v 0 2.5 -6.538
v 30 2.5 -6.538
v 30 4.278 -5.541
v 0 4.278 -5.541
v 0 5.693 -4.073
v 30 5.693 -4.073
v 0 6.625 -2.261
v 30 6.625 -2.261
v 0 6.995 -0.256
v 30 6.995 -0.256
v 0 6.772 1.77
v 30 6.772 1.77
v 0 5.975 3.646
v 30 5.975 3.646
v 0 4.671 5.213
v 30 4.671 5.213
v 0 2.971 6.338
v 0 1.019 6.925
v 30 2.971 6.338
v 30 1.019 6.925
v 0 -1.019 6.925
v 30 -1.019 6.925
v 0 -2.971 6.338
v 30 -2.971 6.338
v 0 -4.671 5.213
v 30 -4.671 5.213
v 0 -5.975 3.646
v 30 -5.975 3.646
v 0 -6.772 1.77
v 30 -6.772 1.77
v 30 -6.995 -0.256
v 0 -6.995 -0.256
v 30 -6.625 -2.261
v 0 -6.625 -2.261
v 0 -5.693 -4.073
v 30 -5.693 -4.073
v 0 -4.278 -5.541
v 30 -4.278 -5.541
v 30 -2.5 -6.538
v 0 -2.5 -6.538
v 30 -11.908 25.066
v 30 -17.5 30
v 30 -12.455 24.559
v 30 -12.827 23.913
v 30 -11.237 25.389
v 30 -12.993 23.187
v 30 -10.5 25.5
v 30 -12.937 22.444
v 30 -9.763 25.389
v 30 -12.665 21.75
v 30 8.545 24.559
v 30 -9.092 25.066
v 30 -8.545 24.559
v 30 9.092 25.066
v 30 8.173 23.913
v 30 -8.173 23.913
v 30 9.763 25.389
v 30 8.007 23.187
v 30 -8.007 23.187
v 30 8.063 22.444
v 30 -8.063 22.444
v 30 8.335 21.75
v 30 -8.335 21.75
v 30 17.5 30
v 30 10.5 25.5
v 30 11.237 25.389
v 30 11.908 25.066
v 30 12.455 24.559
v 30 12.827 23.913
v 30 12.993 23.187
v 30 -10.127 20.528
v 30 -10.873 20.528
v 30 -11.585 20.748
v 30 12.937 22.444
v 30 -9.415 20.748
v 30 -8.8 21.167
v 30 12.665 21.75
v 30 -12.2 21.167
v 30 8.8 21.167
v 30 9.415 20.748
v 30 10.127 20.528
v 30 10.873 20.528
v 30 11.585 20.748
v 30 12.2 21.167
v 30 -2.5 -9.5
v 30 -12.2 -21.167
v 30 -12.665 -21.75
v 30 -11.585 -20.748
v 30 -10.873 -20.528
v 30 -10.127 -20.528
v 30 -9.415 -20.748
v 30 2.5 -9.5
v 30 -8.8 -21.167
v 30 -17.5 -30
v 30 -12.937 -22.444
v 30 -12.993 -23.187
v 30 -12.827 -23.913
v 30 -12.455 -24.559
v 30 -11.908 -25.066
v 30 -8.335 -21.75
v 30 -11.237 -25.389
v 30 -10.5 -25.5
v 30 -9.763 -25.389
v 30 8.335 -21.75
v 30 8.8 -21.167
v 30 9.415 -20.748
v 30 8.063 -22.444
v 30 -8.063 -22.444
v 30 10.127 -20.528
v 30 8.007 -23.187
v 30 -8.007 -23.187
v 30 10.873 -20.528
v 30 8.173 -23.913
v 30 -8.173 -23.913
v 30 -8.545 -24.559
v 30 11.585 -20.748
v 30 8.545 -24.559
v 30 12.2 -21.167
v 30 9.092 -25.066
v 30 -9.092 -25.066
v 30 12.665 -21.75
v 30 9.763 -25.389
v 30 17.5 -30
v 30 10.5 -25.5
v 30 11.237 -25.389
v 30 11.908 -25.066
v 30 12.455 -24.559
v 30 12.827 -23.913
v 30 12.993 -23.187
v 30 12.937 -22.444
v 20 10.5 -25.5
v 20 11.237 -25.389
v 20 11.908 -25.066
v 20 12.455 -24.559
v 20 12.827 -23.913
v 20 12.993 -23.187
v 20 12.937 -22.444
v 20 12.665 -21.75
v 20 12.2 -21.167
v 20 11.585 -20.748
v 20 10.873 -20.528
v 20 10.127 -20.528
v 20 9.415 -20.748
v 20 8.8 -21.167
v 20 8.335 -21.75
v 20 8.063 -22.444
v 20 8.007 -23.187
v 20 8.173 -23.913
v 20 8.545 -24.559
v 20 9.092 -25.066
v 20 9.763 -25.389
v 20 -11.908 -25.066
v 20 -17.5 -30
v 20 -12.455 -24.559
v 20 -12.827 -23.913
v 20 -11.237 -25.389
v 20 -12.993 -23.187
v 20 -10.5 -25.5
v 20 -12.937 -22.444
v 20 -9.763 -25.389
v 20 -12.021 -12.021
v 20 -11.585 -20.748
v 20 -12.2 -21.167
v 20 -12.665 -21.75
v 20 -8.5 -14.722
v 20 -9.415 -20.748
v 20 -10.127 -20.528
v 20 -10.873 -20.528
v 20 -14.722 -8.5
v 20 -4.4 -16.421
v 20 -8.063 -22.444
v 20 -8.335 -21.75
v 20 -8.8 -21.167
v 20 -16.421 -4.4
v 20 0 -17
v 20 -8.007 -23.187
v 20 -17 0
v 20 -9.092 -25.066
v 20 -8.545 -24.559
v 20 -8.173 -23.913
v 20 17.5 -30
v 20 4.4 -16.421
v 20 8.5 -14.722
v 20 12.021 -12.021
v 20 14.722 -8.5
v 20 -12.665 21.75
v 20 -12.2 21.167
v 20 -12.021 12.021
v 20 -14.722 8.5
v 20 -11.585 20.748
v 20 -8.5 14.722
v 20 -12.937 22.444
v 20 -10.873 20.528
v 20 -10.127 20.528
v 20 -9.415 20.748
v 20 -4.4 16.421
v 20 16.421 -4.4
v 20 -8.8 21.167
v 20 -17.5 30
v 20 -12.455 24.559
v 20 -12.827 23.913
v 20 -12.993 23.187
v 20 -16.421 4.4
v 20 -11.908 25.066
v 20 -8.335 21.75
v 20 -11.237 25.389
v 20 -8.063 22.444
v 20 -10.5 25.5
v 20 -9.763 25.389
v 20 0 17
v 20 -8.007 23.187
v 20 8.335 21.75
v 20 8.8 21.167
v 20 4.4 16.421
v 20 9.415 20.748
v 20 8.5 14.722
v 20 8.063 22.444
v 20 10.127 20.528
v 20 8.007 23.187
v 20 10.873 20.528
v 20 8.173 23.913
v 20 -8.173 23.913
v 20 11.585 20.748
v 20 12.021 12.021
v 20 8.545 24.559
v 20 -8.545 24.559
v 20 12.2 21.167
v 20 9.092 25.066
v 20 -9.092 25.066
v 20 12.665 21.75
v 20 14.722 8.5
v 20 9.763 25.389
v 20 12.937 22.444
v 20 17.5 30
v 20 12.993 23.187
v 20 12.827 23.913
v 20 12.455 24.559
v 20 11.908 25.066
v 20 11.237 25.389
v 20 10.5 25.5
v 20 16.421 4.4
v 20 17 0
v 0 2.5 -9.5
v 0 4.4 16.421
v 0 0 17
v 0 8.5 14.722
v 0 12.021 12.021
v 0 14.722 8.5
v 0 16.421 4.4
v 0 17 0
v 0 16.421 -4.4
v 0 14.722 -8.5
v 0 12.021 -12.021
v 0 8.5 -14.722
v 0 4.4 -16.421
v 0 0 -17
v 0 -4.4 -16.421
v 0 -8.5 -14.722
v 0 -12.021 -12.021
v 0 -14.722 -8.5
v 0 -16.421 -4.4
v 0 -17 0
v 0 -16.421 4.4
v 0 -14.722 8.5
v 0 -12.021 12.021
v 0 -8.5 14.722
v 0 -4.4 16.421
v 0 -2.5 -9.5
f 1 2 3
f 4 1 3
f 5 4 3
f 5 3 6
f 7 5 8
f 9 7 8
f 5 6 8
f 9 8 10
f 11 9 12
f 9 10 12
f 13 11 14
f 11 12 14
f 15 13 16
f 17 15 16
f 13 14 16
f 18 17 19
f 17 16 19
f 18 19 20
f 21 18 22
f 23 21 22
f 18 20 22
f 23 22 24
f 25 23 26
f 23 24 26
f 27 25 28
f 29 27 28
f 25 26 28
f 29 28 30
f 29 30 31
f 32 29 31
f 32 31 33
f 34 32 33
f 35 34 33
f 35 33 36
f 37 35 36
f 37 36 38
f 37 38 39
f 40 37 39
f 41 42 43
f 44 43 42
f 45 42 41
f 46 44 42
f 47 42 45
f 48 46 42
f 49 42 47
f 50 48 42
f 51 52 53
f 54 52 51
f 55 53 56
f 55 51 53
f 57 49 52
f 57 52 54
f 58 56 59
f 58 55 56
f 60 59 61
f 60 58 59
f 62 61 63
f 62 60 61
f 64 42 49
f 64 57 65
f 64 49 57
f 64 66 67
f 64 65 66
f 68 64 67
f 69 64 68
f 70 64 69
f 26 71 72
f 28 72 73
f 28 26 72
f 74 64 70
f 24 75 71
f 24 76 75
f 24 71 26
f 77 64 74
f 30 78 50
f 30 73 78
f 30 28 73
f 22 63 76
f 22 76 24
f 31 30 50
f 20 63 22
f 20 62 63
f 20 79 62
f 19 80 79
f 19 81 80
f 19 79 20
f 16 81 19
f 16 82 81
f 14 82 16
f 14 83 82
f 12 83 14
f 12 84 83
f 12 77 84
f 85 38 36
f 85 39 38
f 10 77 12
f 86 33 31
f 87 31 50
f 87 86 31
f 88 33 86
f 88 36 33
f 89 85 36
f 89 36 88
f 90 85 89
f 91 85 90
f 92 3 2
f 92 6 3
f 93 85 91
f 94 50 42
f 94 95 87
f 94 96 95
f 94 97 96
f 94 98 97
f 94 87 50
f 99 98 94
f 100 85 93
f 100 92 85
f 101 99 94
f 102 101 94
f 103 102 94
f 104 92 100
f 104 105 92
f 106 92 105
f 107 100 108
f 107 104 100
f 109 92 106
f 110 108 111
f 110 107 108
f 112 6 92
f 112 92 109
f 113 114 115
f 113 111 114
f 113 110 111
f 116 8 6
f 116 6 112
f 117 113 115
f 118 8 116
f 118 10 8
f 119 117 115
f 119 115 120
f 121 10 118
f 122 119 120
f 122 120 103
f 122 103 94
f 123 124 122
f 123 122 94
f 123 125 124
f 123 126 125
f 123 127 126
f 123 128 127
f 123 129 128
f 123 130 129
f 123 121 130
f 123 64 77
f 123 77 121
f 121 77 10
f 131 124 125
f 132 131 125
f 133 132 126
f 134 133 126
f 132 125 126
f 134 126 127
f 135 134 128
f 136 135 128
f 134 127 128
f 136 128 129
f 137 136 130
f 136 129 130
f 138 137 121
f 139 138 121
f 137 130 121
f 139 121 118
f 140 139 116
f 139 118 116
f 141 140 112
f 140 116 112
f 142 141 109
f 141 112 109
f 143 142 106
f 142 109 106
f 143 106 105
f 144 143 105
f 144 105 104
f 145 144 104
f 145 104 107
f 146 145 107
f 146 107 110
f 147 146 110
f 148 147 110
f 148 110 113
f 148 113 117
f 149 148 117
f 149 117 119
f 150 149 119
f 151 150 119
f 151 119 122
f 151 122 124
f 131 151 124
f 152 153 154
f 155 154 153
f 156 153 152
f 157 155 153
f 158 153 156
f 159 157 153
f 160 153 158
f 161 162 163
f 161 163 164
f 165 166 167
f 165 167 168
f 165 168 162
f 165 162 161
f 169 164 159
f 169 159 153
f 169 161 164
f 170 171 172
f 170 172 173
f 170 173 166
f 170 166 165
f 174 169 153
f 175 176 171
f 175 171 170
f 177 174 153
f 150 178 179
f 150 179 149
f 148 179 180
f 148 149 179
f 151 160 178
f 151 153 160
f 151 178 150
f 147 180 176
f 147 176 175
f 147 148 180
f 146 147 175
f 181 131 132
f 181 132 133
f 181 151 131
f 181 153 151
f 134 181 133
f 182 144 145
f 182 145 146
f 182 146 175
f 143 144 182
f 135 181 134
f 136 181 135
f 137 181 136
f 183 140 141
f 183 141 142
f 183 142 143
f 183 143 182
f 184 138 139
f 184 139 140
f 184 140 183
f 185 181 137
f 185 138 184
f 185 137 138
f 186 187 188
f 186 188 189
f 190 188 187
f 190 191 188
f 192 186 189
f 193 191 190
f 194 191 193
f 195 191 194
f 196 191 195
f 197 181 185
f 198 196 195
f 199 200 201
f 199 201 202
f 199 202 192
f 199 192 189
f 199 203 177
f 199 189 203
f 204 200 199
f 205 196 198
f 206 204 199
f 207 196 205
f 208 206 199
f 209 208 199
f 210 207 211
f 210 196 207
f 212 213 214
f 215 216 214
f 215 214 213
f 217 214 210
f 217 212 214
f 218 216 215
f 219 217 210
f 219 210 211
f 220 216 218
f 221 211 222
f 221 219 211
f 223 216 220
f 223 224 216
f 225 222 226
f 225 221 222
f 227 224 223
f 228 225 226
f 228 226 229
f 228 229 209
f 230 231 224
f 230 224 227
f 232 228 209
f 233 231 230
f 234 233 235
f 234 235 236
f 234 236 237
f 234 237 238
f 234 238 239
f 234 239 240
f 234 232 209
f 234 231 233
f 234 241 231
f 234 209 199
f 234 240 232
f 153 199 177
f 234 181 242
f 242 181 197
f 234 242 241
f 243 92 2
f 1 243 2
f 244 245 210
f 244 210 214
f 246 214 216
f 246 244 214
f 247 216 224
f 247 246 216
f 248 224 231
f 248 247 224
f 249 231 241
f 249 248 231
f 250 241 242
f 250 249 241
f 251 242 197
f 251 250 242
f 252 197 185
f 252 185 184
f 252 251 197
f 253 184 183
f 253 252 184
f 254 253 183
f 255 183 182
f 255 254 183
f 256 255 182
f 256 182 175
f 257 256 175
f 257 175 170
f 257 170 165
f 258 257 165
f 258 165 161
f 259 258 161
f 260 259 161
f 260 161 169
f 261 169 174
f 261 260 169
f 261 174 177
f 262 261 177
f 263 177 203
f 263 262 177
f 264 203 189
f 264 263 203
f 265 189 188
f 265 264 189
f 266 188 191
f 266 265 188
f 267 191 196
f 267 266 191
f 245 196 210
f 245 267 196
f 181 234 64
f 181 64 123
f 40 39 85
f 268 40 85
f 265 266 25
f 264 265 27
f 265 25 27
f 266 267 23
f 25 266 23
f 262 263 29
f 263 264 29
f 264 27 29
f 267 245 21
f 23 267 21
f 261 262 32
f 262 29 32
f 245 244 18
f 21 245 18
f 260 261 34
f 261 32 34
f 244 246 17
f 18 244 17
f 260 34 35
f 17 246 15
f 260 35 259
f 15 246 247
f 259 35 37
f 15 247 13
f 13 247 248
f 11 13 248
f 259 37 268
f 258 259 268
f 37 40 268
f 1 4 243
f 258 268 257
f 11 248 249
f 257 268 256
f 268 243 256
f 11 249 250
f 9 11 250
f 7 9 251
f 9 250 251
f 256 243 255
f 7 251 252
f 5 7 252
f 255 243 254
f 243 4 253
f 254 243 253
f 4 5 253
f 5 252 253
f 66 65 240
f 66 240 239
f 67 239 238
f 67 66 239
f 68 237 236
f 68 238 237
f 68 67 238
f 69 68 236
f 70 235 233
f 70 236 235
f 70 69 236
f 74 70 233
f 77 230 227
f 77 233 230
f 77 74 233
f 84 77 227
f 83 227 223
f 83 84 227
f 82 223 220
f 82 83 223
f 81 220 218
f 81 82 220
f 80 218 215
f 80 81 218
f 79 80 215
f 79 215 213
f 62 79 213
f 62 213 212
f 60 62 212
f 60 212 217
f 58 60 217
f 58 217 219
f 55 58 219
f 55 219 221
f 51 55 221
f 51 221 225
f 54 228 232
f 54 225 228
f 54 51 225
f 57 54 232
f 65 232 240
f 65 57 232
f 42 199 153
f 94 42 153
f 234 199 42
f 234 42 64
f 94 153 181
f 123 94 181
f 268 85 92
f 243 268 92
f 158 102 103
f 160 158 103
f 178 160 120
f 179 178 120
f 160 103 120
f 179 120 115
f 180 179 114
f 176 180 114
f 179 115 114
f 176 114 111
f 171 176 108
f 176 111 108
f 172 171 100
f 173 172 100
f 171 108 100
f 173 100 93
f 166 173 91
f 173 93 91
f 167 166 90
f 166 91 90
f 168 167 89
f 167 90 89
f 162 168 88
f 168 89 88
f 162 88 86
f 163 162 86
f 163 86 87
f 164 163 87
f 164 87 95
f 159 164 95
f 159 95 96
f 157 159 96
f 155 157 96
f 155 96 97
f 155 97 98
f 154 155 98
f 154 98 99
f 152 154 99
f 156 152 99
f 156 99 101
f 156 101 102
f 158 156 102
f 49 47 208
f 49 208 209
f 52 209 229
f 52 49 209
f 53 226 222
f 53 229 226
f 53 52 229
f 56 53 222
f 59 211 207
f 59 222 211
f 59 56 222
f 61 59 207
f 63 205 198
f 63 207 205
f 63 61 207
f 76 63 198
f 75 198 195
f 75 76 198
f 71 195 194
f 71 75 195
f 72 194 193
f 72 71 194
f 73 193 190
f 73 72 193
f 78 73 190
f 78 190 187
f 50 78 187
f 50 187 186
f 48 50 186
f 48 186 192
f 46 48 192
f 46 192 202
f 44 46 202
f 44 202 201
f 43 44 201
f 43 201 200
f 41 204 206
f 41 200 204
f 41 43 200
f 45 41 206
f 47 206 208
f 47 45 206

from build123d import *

# Parameters (mm, degrees)
SKETCH1_W                = 60
SKETCH1_H                = 35
BOSS_EXTRUDE1_DEPTH      = 30
CUT_EXTRUDE1_DEPTH       = 31
F_5_0_5_DIAMETER_HOLE1_D = 5
SKETCH6_W                = 60
SKETCH6_H                = 35
SKETCH6_R                = 17
CUT_EXTRUDE2_DEPTH       = 20


with BuildPart() as part:
    # Sketch1 → Boss-Extrude1 (new body)
    with BuildSketch(Plane(origin=(0, 0, 0), x_dir=(0, 0, -1), z_dir=(1, 0, 0))):
        Rectangle(SKETCH1_W, SKETCH1_H)
    extrude(amount=BOSS_EXTRUDE1_DEPTH)

    # Sketch2 → Cut-Extrude1 (cut, through all)
    with BuildSketch(Plane(origin=(30, 0, 0), x_dir=(0, 0, -1), z_dir=(1, 0, 0))):
        with BuildLine():
            Line((4.5, 2.5), (4.5, -2.5))
            Line((4.5, -2.5), (6.538348415, -2.5))
            ThreePointArc((6.538348415, -2.5), (6.883619648, -1.271133567), (7, 0))
            ThreePointArc((7, 0), (6.883619648, 1.271133567), (6.538348415, 2.5))
            Line((6.538348415, 2.5), (4.5, 2.5))
        make_face()
        with BuildLine():
            Line((6.538348415, -2.5), (4.5, -2.5))
            Line((4.5, -2.5), (4.5, 2.5))
            Line((4.5, 2.5), (6.538348415, 2.5))
            ThreePointArc((6.538348415, 2.5), (-7, 0), (6.538348415, -2.5))
        make_face()
        with BuildLine():
            ThreePointArc((7, 0), (6.883619648, -1.271133567), (6.538348415, -2.5))
            Line((6.538348415, -2.5), (9.5, -2.5))
            Line((9.5, -2.5), (9.5, 2.5))
            Line((9.5, 2.5), (6.538348415, 2.5))
            ThreePointArc((6.538348415, 2.5), (6.883619648, 1.271133567), (7, 0))
        make_face()
    extrude(amount=-CUT_EXTRUDE1_DEPTH, mode=Mode.SUBTRACT)

    # Ø5.0 (5) Diameter Hole1 (through all)
    with Locations(Plane.ZY):
        with Locations((-23, 10.5), (-23, -10.5)):
            f_5_0_5_diameter_hole1 = Hole(F_5_0_5_DIAMETER_HOLE1_D / 2)

    # Mirror1: Ø5.0 (5) Diameter Hole1 across plane
    add(f_5_0_5_diameter_hole1.mirror(Plane.XY), mode=Mode.SUBTRACT)

    # Sketch6 → Cut-Extrude2 (cut)
    with BuildSketch(Plane.ZY):
        Rectangle(SKETCH6_W, SKETCH6_H)
        Circle(SKETCH6_R, mode=Mode.SUBTRACT)
    extrude(amount=-CUT_EXTRUDE2_DEPTH, mode=Mode.SUBTRACT)


solid = part.part
